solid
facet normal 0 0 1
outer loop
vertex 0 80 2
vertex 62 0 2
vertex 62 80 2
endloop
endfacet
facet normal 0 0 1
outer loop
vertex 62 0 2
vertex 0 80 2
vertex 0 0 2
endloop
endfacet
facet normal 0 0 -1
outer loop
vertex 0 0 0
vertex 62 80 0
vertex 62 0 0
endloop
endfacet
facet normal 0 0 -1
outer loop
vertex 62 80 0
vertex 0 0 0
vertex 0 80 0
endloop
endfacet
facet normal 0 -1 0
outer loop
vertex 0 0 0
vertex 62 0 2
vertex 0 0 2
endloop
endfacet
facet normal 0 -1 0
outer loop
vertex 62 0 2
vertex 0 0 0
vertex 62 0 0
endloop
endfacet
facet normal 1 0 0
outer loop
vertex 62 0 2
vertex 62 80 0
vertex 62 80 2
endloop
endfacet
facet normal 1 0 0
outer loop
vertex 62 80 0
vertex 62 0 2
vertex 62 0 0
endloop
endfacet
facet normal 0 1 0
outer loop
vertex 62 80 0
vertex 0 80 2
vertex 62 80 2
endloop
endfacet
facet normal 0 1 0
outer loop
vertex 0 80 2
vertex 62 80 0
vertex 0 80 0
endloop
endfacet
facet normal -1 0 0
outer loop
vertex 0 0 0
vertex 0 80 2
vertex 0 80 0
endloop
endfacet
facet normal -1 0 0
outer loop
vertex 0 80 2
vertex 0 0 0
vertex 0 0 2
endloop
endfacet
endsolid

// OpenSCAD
//union() {
    cube ([62,80,2]);
    translate([63,0,0]) linear_extrude(height = 10, center = false)
        import (file = "/Users/mhuot/Downloads/mhtest3.dxf", scale = 0.2);
//}
